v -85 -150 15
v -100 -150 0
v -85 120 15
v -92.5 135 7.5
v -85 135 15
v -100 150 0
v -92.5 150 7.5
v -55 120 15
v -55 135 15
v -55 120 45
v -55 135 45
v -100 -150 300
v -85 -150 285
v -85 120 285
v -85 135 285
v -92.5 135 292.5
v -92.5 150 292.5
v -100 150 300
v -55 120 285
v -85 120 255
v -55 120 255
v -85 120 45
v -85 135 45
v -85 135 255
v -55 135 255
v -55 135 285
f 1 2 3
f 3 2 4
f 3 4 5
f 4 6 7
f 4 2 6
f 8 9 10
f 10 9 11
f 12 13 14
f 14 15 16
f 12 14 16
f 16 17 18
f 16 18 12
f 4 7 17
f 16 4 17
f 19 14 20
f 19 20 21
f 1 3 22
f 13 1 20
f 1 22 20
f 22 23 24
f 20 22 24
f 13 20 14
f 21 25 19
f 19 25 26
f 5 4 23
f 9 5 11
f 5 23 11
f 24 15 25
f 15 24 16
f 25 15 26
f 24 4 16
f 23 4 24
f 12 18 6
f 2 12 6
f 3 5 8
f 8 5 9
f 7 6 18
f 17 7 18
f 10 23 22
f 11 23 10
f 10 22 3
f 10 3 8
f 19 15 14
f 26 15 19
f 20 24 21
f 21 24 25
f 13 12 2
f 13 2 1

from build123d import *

# Parameters (mm, degrees)
F5_DEPTH      = 150
F5_DEPTH_BACK = 150
F6_W          = 12.5
F6_H          = 300
F7_DEPTH      = 15
F9_W          = 30
F9_H          = 30
F10_DEPTH     = 15


with BuildPart() as f5:
    # F2 (on Front) → F5 (new body, two sides)
    with BuildSketch(Plane.XZ) as f5_sk:
        Polygon((-100, 300), (-100, 0), (-85, 15), (-85, 285), align=None)
    extrude(amount=-F5_DEPTH)
    extrude(f5_sk.sketch, amount=F5_DEPTH_BACK)

    # F6 (on offset) → F7 (cut)
    with BuildSketch(Plane.XZ.offset(-150)):
        with Locations((-86.25, 150)):
            Rectangle(F6_W, F6_H)
    extrude(amount=F7_DEPTH, mode=Mode.SUBTRACT)

    # F9 (on offset) → F10 (join)
    with BuildSketch(Plane.XZ.offset(-135)):
        with Locations((-70, 270)):
            Rectangle(F9_W, F9_H)
        with Locations((-70, 30)):
            Rectangle(F9_W, F9_H)
    extrude(amount=F10_DEPTH)


solid = f5.part
